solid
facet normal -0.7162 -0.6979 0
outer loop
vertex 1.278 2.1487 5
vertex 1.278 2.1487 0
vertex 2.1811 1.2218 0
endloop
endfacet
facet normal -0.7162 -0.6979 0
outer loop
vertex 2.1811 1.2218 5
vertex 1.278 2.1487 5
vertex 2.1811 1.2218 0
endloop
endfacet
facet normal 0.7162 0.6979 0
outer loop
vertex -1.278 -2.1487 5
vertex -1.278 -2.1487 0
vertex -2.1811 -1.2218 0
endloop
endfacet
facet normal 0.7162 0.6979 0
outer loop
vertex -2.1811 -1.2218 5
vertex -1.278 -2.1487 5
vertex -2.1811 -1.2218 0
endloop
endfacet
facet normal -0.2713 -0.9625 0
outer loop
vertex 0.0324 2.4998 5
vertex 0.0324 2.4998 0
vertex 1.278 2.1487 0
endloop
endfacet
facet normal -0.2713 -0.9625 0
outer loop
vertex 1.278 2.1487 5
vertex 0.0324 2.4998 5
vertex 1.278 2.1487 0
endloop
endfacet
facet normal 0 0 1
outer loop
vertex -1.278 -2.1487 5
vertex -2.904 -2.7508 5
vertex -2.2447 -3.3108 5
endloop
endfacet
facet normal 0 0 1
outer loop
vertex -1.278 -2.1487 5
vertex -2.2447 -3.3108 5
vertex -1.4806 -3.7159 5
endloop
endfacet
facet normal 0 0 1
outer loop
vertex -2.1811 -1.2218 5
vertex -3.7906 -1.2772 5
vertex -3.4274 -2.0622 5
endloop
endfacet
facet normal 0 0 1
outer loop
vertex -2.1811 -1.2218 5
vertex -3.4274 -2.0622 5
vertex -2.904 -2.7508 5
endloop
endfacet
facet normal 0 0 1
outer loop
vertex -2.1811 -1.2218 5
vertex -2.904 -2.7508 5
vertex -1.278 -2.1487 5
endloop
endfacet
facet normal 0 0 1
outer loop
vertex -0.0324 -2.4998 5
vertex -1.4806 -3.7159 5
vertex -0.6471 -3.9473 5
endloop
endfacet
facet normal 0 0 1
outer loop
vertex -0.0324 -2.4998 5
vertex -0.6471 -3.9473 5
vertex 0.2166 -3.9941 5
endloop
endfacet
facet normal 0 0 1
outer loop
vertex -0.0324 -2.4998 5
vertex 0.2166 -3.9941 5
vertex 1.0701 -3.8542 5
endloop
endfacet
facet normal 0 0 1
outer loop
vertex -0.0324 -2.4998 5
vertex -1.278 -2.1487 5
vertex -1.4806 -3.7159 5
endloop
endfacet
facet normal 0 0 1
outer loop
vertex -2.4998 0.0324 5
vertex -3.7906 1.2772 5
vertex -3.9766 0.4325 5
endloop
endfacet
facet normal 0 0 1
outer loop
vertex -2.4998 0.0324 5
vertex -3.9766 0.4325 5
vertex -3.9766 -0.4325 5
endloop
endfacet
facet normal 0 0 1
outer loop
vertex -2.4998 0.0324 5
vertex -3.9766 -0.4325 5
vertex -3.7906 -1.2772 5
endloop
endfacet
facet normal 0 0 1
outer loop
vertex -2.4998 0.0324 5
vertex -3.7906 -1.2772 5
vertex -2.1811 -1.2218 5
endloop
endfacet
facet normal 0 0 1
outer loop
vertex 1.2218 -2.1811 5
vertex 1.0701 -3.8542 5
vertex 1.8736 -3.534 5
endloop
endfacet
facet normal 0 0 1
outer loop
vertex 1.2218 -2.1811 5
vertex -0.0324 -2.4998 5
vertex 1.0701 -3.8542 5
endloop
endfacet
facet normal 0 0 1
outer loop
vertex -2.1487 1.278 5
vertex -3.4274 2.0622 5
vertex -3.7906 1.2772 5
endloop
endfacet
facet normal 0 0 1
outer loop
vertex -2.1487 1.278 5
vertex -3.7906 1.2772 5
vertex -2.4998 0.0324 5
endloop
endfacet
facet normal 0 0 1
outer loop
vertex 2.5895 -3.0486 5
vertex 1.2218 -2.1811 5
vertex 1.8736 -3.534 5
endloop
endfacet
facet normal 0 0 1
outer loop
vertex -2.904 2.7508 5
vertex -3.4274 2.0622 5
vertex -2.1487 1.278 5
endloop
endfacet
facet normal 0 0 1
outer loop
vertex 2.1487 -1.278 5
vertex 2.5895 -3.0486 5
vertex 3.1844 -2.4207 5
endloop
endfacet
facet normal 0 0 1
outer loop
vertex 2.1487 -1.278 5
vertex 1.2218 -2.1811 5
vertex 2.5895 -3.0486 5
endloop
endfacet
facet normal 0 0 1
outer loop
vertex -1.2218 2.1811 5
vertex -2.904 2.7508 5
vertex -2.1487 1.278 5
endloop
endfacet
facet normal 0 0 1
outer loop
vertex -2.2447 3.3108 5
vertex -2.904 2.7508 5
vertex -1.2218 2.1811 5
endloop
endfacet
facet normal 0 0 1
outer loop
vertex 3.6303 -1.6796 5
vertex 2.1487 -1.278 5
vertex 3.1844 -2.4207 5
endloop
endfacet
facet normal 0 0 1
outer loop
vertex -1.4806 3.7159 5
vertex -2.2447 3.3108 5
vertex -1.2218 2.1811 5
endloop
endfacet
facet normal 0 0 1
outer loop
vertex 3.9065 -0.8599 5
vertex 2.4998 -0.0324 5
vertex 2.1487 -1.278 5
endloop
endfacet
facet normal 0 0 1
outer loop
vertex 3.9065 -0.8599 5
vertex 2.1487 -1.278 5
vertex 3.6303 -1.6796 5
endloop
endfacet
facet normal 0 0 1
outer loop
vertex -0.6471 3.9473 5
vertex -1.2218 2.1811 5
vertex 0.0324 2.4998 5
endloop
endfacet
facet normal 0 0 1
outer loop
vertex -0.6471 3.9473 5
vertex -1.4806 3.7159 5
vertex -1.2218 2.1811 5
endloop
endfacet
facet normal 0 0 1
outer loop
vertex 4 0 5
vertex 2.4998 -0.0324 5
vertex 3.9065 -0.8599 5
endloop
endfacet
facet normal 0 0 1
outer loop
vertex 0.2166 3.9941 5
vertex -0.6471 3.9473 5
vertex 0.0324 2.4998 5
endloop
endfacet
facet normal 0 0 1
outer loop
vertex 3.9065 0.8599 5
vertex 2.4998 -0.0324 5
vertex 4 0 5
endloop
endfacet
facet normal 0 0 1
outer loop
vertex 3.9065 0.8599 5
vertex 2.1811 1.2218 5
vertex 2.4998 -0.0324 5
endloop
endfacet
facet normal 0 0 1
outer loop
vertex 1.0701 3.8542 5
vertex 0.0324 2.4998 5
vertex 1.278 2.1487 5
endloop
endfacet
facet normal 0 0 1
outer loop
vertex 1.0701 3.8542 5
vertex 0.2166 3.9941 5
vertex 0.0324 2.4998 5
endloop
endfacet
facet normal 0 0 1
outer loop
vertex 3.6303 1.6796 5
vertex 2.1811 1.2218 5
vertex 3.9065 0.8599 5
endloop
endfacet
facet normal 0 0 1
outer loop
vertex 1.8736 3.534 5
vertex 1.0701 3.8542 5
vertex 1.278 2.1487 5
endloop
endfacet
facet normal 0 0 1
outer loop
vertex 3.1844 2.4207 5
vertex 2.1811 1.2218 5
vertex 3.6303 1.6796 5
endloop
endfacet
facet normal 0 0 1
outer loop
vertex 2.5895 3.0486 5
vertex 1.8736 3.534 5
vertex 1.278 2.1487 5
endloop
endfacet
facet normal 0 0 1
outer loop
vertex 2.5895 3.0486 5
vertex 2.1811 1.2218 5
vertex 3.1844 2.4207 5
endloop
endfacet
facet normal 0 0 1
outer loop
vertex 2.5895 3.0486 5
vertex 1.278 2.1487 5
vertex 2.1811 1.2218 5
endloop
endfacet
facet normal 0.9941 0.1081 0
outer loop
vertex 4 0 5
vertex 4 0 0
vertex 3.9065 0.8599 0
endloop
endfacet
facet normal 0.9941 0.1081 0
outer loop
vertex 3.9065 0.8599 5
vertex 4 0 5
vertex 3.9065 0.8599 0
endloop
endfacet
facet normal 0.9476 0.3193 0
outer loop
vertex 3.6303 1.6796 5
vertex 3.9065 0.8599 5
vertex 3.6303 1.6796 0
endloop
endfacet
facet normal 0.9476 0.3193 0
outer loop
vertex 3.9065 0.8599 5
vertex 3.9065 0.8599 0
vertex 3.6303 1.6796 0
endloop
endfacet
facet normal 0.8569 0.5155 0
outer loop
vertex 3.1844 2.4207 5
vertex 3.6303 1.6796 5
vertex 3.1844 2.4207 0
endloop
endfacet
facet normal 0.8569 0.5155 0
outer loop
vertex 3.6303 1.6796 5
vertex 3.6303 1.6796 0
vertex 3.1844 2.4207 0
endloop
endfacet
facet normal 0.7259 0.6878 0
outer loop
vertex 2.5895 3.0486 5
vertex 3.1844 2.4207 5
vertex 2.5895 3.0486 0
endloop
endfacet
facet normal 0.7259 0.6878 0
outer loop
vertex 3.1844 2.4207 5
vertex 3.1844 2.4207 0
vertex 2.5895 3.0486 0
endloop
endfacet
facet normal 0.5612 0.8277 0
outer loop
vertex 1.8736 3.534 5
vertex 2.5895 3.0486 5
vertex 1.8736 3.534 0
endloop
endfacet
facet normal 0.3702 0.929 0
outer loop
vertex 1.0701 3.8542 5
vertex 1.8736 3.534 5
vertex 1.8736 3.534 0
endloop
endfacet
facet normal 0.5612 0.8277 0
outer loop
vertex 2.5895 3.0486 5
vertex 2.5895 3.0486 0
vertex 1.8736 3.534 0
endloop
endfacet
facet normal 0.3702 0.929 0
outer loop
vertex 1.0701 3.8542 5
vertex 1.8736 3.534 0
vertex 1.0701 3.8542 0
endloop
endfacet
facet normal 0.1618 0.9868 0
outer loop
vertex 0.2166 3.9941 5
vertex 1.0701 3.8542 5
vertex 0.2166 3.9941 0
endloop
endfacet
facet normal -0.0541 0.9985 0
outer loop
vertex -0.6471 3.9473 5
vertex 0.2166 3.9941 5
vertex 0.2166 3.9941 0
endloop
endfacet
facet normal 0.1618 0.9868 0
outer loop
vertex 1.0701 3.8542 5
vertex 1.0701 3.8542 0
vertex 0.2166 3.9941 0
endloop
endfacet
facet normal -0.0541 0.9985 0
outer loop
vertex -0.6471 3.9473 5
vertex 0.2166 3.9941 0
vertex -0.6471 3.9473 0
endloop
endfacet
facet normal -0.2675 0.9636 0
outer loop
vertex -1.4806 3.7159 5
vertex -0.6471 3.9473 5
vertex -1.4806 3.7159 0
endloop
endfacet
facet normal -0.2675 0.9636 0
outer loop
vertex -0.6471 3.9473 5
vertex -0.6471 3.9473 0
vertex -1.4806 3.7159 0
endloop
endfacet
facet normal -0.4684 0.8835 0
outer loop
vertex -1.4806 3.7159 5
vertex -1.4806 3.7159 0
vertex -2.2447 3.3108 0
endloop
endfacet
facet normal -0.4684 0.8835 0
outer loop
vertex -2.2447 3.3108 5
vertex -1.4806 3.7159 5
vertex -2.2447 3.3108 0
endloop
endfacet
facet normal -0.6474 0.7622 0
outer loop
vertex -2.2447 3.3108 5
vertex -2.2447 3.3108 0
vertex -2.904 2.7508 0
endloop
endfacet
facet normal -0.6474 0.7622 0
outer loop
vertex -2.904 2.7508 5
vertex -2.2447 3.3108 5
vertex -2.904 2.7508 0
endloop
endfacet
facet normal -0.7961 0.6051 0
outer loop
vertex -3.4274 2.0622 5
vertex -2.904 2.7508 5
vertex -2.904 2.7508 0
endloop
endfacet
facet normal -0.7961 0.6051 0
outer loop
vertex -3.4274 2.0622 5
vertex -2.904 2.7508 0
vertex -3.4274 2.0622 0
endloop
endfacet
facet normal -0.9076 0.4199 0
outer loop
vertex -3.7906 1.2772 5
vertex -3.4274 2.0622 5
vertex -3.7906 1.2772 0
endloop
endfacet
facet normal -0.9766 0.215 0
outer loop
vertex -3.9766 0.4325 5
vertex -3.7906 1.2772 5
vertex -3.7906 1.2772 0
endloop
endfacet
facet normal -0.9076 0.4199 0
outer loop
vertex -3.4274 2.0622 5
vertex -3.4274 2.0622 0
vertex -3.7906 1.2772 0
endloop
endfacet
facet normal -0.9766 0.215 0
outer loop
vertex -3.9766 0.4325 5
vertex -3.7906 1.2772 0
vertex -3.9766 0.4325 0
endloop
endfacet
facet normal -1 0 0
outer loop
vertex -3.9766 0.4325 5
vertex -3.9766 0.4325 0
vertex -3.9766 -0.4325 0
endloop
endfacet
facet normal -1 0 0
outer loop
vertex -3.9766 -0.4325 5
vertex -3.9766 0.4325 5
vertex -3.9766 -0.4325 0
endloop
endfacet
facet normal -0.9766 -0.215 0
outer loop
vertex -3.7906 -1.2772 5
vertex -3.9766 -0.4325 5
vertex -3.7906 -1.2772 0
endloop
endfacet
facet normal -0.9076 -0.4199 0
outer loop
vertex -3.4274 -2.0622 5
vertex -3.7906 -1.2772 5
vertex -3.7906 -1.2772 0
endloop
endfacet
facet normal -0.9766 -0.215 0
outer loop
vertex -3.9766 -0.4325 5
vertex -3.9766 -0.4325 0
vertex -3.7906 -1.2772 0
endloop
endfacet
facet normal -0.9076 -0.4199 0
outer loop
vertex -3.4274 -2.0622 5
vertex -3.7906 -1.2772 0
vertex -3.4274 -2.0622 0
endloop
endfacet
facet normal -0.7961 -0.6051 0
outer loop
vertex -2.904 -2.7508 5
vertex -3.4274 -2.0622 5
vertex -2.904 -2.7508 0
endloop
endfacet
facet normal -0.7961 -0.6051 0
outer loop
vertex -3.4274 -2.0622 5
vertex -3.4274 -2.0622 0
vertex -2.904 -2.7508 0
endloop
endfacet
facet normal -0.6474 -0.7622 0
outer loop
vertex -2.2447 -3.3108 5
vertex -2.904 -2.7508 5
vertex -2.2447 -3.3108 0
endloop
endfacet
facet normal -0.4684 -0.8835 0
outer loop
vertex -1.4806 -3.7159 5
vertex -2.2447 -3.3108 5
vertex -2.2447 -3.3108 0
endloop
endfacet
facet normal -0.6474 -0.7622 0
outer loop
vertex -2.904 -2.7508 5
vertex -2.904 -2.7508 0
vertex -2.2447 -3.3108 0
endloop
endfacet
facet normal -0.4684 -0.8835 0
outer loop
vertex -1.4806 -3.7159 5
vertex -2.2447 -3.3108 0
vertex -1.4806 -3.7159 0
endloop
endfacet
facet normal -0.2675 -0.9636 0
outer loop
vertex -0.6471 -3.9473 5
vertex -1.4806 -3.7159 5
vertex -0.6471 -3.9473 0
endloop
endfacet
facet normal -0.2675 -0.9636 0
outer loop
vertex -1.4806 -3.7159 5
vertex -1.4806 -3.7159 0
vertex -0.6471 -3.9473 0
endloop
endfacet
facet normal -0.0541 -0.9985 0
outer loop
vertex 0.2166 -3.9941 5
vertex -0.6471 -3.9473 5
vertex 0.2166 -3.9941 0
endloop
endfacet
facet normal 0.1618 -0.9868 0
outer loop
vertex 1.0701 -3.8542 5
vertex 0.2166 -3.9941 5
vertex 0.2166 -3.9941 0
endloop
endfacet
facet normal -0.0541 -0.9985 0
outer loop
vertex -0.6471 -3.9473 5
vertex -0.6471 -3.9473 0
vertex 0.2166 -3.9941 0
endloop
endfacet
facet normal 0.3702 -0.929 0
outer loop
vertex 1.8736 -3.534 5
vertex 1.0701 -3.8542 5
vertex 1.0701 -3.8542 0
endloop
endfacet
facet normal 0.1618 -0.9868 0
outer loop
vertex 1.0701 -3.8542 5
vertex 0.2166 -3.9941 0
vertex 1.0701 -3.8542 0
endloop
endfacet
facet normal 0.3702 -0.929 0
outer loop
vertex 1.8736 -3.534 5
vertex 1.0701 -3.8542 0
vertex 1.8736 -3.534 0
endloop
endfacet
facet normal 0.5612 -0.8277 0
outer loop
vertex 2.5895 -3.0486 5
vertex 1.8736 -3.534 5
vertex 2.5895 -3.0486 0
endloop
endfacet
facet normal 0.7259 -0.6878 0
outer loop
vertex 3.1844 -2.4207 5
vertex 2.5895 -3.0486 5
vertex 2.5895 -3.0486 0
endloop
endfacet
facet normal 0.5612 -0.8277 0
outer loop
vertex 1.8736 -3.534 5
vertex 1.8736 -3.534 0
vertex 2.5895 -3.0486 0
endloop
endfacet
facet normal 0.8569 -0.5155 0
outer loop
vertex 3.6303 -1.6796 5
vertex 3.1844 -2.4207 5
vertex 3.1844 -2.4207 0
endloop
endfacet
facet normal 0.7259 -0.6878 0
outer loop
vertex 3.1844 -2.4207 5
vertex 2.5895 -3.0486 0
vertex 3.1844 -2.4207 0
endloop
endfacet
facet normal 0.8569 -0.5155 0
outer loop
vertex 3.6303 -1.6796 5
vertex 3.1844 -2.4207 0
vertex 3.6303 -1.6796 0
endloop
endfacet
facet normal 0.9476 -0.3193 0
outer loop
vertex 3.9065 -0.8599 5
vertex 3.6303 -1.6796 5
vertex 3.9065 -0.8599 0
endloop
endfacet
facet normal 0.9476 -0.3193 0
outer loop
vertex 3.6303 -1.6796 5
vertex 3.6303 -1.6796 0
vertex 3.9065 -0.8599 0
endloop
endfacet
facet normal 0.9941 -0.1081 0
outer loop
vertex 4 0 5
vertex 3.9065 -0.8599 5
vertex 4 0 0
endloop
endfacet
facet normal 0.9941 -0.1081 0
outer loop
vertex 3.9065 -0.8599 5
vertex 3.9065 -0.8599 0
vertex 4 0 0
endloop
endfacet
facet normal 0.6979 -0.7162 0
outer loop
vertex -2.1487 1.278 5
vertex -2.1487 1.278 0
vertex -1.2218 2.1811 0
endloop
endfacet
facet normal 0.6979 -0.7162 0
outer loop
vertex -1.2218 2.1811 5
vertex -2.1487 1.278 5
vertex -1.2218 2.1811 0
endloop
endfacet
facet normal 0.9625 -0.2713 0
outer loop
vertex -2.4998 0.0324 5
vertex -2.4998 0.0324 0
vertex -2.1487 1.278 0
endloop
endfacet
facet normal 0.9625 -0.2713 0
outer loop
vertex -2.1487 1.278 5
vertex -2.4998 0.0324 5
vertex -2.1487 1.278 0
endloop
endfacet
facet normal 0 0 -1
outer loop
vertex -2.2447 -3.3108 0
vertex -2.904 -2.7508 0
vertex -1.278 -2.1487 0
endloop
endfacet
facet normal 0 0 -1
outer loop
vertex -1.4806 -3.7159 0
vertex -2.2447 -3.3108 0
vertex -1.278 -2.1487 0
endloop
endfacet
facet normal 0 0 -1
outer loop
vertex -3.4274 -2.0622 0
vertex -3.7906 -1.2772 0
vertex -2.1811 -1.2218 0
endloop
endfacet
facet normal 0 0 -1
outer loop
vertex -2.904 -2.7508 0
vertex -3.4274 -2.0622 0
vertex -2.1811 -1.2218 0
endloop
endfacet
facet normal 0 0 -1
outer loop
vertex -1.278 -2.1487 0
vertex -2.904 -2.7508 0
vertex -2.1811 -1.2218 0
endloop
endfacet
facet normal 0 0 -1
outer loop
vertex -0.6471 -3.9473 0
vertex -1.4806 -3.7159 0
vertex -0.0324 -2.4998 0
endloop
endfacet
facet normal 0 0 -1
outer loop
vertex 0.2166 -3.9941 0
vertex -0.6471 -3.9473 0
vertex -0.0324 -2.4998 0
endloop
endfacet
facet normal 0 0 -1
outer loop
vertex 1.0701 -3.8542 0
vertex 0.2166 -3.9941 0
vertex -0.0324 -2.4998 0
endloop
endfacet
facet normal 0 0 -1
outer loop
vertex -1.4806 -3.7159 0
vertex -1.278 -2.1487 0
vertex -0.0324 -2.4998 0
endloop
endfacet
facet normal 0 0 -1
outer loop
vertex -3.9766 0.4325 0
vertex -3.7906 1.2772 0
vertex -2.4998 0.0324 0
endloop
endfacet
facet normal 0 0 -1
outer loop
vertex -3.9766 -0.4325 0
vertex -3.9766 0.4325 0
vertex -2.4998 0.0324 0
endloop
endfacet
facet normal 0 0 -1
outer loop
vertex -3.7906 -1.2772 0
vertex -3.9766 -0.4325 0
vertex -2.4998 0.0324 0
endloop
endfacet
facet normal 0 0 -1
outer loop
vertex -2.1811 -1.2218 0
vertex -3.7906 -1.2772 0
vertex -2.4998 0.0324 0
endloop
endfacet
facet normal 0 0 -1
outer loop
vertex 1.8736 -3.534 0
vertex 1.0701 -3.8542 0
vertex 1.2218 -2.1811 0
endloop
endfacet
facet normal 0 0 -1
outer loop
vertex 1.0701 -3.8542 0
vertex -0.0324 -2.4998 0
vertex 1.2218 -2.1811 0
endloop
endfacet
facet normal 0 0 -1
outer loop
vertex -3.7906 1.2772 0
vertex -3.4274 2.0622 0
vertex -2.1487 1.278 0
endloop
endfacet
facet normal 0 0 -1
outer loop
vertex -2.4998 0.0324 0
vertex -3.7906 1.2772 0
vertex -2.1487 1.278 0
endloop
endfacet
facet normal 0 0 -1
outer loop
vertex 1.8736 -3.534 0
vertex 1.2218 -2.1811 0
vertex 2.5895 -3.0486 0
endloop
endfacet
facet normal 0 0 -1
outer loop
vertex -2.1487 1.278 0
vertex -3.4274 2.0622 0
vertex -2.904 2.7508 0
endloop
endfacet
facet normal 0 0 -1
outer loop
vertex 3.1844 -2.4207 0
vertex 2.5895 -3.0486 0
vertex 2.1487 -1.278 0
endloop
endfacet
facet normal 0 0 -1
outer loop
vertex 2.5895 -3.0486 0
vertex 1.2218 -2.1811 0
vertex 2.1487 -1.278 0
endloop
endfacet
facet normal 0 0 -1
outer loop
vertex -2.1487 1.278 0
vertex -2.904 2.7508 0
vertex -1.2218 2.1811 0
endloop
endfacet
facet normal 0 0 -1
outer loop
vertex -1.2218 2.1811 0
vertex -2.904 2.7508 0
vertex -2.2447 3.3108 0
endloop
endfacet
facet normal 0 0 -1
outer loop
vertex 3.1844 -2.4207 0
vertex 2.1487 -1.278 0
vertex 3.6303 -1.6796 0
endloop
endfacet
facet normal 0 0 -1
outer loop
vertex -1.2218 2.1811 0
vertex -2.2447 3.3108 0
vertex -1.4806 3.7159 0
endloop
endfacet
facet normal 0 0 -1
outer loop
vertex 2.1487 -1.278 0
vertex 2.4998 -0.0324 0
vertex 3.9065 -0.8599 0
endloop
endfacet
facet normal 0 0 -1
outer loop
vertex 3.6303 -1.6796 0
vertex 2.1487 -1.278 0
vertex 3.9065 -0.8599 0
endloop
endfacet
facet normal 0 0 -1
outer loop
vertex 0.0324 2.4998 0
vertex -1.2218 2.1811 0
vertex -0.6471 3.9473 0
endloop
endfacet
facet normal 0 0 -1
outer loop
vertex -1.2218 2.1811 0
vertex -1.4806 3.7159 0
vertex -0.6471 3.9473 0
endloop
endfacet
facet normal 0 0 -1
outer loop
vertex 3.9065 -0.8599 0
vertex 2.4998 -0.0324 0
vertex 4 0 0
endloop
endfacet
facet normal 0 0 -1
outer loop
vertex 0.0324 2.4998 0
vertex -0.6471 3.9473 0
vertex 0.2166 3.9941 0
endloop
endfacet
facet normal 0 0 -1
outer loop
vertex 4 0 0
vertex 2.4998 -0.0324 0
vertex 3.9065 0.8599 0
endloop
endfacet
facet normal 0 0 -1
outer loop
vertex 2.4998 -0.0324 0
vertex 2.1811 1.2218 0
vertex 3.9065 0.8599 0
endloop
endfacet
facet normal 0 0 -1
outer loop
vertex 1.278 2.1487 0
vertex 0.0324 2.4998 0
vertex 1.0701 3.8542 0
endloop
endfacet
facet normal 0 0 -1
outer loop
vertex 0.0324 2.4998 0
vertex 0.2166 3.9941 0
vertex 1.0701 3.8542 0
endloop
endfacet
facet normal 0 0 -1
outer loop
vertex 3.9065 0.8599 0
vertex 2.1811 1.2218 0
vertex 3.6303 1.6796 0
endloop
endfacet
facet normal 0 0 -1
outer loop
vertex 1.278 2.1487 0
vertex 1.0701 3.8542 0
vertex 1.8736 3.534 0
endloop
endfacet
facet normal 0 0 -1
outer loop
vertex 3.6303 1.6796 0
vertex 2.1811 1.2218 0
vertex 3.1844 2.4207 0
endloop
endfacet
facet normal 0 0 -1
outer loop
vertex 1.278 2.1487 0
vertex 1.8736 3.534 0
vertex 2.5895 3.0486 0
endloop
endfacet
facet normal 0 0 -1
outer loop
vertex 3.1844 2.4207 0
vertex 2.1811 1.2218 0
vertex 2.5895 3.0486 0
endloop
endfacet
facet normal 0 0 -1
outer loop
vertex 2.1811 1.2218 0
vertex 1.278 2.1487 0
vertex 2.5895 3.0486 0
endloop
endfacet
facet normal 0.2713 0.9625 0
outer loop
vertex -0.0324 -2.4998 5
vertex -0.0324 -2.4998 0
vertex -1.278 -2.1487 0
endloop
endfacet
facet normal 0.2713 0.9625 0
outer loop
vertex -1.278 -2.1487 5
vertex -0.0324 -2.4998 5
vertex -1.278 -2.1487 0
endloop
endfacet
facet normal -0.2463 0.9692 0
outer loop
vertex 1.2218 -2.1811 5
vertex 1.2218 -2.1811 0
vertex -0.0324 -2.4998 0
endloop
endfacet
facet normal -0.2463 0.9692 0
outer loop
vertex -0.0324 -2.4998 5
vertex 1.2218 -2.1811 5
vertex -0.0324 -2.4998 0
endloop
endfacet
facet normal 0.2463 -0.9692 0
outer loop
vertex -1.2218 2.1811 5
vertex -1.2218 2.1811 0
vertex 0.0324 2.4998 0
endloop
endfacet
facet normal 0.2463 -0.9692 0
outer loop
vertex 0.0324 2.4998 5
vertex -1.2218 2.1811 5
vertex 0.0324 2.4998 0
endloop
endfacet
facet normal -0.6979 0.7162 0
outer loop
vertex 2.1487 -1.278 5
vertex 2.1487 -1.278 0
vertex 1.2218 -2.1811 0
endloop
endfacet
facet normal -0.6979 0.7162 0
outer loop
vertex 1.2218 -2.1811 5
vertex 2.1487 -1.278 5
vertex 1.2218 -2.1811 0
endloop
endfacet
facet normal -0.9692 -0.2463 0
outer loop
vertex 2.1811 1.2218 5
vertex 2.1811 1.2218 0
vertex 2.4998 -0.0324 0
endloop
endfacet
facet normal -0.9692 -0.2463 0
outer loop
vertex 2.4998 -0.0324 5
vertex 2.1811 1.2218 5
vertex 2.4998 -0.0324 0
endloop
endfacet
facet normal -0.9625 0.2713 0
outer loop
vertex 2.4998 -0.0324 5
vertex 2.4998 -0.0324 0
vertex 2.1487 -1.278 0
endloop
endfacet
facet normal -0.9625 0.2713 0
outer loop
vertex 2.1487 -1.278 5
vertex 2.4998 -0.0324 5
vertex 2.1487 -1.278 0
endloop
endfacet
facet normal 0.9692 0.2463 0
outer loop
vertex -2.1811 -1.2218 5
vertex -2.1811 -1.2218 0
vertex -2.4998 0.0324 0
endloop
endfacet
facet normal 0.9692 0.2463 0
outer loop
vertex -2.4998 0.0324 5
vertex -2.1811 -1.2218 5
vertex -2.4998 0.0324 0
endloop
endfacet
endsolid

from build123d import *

# Parameters (mm, degrees)
F0_R     = 4
F1_DEPTH = 5


with BuildPart() as f1:
    # F0 (on Top) → F1 (new body)
    with BuildSketch(Plane.XY):
        Circle(F0_R)
        Polygon((-0.032408, -2.49979), (-1.277961, -2.148678), (-2.181086, -1.221829), (-2.49979, 0.032408), (-2.148678, 1.277961), (-1.221829, 2.181086), (0.032408, 2.49979), (1.277961, 2.148678), (2.181086, 1.221829), (2.49979, -0.032408), (2.148678, -1.277961), (1.221829, -2.181086), align=None, mode=Mode.SUBTRACT)
    extrude(amount=F1_DEPTH)


solid = f1.part
